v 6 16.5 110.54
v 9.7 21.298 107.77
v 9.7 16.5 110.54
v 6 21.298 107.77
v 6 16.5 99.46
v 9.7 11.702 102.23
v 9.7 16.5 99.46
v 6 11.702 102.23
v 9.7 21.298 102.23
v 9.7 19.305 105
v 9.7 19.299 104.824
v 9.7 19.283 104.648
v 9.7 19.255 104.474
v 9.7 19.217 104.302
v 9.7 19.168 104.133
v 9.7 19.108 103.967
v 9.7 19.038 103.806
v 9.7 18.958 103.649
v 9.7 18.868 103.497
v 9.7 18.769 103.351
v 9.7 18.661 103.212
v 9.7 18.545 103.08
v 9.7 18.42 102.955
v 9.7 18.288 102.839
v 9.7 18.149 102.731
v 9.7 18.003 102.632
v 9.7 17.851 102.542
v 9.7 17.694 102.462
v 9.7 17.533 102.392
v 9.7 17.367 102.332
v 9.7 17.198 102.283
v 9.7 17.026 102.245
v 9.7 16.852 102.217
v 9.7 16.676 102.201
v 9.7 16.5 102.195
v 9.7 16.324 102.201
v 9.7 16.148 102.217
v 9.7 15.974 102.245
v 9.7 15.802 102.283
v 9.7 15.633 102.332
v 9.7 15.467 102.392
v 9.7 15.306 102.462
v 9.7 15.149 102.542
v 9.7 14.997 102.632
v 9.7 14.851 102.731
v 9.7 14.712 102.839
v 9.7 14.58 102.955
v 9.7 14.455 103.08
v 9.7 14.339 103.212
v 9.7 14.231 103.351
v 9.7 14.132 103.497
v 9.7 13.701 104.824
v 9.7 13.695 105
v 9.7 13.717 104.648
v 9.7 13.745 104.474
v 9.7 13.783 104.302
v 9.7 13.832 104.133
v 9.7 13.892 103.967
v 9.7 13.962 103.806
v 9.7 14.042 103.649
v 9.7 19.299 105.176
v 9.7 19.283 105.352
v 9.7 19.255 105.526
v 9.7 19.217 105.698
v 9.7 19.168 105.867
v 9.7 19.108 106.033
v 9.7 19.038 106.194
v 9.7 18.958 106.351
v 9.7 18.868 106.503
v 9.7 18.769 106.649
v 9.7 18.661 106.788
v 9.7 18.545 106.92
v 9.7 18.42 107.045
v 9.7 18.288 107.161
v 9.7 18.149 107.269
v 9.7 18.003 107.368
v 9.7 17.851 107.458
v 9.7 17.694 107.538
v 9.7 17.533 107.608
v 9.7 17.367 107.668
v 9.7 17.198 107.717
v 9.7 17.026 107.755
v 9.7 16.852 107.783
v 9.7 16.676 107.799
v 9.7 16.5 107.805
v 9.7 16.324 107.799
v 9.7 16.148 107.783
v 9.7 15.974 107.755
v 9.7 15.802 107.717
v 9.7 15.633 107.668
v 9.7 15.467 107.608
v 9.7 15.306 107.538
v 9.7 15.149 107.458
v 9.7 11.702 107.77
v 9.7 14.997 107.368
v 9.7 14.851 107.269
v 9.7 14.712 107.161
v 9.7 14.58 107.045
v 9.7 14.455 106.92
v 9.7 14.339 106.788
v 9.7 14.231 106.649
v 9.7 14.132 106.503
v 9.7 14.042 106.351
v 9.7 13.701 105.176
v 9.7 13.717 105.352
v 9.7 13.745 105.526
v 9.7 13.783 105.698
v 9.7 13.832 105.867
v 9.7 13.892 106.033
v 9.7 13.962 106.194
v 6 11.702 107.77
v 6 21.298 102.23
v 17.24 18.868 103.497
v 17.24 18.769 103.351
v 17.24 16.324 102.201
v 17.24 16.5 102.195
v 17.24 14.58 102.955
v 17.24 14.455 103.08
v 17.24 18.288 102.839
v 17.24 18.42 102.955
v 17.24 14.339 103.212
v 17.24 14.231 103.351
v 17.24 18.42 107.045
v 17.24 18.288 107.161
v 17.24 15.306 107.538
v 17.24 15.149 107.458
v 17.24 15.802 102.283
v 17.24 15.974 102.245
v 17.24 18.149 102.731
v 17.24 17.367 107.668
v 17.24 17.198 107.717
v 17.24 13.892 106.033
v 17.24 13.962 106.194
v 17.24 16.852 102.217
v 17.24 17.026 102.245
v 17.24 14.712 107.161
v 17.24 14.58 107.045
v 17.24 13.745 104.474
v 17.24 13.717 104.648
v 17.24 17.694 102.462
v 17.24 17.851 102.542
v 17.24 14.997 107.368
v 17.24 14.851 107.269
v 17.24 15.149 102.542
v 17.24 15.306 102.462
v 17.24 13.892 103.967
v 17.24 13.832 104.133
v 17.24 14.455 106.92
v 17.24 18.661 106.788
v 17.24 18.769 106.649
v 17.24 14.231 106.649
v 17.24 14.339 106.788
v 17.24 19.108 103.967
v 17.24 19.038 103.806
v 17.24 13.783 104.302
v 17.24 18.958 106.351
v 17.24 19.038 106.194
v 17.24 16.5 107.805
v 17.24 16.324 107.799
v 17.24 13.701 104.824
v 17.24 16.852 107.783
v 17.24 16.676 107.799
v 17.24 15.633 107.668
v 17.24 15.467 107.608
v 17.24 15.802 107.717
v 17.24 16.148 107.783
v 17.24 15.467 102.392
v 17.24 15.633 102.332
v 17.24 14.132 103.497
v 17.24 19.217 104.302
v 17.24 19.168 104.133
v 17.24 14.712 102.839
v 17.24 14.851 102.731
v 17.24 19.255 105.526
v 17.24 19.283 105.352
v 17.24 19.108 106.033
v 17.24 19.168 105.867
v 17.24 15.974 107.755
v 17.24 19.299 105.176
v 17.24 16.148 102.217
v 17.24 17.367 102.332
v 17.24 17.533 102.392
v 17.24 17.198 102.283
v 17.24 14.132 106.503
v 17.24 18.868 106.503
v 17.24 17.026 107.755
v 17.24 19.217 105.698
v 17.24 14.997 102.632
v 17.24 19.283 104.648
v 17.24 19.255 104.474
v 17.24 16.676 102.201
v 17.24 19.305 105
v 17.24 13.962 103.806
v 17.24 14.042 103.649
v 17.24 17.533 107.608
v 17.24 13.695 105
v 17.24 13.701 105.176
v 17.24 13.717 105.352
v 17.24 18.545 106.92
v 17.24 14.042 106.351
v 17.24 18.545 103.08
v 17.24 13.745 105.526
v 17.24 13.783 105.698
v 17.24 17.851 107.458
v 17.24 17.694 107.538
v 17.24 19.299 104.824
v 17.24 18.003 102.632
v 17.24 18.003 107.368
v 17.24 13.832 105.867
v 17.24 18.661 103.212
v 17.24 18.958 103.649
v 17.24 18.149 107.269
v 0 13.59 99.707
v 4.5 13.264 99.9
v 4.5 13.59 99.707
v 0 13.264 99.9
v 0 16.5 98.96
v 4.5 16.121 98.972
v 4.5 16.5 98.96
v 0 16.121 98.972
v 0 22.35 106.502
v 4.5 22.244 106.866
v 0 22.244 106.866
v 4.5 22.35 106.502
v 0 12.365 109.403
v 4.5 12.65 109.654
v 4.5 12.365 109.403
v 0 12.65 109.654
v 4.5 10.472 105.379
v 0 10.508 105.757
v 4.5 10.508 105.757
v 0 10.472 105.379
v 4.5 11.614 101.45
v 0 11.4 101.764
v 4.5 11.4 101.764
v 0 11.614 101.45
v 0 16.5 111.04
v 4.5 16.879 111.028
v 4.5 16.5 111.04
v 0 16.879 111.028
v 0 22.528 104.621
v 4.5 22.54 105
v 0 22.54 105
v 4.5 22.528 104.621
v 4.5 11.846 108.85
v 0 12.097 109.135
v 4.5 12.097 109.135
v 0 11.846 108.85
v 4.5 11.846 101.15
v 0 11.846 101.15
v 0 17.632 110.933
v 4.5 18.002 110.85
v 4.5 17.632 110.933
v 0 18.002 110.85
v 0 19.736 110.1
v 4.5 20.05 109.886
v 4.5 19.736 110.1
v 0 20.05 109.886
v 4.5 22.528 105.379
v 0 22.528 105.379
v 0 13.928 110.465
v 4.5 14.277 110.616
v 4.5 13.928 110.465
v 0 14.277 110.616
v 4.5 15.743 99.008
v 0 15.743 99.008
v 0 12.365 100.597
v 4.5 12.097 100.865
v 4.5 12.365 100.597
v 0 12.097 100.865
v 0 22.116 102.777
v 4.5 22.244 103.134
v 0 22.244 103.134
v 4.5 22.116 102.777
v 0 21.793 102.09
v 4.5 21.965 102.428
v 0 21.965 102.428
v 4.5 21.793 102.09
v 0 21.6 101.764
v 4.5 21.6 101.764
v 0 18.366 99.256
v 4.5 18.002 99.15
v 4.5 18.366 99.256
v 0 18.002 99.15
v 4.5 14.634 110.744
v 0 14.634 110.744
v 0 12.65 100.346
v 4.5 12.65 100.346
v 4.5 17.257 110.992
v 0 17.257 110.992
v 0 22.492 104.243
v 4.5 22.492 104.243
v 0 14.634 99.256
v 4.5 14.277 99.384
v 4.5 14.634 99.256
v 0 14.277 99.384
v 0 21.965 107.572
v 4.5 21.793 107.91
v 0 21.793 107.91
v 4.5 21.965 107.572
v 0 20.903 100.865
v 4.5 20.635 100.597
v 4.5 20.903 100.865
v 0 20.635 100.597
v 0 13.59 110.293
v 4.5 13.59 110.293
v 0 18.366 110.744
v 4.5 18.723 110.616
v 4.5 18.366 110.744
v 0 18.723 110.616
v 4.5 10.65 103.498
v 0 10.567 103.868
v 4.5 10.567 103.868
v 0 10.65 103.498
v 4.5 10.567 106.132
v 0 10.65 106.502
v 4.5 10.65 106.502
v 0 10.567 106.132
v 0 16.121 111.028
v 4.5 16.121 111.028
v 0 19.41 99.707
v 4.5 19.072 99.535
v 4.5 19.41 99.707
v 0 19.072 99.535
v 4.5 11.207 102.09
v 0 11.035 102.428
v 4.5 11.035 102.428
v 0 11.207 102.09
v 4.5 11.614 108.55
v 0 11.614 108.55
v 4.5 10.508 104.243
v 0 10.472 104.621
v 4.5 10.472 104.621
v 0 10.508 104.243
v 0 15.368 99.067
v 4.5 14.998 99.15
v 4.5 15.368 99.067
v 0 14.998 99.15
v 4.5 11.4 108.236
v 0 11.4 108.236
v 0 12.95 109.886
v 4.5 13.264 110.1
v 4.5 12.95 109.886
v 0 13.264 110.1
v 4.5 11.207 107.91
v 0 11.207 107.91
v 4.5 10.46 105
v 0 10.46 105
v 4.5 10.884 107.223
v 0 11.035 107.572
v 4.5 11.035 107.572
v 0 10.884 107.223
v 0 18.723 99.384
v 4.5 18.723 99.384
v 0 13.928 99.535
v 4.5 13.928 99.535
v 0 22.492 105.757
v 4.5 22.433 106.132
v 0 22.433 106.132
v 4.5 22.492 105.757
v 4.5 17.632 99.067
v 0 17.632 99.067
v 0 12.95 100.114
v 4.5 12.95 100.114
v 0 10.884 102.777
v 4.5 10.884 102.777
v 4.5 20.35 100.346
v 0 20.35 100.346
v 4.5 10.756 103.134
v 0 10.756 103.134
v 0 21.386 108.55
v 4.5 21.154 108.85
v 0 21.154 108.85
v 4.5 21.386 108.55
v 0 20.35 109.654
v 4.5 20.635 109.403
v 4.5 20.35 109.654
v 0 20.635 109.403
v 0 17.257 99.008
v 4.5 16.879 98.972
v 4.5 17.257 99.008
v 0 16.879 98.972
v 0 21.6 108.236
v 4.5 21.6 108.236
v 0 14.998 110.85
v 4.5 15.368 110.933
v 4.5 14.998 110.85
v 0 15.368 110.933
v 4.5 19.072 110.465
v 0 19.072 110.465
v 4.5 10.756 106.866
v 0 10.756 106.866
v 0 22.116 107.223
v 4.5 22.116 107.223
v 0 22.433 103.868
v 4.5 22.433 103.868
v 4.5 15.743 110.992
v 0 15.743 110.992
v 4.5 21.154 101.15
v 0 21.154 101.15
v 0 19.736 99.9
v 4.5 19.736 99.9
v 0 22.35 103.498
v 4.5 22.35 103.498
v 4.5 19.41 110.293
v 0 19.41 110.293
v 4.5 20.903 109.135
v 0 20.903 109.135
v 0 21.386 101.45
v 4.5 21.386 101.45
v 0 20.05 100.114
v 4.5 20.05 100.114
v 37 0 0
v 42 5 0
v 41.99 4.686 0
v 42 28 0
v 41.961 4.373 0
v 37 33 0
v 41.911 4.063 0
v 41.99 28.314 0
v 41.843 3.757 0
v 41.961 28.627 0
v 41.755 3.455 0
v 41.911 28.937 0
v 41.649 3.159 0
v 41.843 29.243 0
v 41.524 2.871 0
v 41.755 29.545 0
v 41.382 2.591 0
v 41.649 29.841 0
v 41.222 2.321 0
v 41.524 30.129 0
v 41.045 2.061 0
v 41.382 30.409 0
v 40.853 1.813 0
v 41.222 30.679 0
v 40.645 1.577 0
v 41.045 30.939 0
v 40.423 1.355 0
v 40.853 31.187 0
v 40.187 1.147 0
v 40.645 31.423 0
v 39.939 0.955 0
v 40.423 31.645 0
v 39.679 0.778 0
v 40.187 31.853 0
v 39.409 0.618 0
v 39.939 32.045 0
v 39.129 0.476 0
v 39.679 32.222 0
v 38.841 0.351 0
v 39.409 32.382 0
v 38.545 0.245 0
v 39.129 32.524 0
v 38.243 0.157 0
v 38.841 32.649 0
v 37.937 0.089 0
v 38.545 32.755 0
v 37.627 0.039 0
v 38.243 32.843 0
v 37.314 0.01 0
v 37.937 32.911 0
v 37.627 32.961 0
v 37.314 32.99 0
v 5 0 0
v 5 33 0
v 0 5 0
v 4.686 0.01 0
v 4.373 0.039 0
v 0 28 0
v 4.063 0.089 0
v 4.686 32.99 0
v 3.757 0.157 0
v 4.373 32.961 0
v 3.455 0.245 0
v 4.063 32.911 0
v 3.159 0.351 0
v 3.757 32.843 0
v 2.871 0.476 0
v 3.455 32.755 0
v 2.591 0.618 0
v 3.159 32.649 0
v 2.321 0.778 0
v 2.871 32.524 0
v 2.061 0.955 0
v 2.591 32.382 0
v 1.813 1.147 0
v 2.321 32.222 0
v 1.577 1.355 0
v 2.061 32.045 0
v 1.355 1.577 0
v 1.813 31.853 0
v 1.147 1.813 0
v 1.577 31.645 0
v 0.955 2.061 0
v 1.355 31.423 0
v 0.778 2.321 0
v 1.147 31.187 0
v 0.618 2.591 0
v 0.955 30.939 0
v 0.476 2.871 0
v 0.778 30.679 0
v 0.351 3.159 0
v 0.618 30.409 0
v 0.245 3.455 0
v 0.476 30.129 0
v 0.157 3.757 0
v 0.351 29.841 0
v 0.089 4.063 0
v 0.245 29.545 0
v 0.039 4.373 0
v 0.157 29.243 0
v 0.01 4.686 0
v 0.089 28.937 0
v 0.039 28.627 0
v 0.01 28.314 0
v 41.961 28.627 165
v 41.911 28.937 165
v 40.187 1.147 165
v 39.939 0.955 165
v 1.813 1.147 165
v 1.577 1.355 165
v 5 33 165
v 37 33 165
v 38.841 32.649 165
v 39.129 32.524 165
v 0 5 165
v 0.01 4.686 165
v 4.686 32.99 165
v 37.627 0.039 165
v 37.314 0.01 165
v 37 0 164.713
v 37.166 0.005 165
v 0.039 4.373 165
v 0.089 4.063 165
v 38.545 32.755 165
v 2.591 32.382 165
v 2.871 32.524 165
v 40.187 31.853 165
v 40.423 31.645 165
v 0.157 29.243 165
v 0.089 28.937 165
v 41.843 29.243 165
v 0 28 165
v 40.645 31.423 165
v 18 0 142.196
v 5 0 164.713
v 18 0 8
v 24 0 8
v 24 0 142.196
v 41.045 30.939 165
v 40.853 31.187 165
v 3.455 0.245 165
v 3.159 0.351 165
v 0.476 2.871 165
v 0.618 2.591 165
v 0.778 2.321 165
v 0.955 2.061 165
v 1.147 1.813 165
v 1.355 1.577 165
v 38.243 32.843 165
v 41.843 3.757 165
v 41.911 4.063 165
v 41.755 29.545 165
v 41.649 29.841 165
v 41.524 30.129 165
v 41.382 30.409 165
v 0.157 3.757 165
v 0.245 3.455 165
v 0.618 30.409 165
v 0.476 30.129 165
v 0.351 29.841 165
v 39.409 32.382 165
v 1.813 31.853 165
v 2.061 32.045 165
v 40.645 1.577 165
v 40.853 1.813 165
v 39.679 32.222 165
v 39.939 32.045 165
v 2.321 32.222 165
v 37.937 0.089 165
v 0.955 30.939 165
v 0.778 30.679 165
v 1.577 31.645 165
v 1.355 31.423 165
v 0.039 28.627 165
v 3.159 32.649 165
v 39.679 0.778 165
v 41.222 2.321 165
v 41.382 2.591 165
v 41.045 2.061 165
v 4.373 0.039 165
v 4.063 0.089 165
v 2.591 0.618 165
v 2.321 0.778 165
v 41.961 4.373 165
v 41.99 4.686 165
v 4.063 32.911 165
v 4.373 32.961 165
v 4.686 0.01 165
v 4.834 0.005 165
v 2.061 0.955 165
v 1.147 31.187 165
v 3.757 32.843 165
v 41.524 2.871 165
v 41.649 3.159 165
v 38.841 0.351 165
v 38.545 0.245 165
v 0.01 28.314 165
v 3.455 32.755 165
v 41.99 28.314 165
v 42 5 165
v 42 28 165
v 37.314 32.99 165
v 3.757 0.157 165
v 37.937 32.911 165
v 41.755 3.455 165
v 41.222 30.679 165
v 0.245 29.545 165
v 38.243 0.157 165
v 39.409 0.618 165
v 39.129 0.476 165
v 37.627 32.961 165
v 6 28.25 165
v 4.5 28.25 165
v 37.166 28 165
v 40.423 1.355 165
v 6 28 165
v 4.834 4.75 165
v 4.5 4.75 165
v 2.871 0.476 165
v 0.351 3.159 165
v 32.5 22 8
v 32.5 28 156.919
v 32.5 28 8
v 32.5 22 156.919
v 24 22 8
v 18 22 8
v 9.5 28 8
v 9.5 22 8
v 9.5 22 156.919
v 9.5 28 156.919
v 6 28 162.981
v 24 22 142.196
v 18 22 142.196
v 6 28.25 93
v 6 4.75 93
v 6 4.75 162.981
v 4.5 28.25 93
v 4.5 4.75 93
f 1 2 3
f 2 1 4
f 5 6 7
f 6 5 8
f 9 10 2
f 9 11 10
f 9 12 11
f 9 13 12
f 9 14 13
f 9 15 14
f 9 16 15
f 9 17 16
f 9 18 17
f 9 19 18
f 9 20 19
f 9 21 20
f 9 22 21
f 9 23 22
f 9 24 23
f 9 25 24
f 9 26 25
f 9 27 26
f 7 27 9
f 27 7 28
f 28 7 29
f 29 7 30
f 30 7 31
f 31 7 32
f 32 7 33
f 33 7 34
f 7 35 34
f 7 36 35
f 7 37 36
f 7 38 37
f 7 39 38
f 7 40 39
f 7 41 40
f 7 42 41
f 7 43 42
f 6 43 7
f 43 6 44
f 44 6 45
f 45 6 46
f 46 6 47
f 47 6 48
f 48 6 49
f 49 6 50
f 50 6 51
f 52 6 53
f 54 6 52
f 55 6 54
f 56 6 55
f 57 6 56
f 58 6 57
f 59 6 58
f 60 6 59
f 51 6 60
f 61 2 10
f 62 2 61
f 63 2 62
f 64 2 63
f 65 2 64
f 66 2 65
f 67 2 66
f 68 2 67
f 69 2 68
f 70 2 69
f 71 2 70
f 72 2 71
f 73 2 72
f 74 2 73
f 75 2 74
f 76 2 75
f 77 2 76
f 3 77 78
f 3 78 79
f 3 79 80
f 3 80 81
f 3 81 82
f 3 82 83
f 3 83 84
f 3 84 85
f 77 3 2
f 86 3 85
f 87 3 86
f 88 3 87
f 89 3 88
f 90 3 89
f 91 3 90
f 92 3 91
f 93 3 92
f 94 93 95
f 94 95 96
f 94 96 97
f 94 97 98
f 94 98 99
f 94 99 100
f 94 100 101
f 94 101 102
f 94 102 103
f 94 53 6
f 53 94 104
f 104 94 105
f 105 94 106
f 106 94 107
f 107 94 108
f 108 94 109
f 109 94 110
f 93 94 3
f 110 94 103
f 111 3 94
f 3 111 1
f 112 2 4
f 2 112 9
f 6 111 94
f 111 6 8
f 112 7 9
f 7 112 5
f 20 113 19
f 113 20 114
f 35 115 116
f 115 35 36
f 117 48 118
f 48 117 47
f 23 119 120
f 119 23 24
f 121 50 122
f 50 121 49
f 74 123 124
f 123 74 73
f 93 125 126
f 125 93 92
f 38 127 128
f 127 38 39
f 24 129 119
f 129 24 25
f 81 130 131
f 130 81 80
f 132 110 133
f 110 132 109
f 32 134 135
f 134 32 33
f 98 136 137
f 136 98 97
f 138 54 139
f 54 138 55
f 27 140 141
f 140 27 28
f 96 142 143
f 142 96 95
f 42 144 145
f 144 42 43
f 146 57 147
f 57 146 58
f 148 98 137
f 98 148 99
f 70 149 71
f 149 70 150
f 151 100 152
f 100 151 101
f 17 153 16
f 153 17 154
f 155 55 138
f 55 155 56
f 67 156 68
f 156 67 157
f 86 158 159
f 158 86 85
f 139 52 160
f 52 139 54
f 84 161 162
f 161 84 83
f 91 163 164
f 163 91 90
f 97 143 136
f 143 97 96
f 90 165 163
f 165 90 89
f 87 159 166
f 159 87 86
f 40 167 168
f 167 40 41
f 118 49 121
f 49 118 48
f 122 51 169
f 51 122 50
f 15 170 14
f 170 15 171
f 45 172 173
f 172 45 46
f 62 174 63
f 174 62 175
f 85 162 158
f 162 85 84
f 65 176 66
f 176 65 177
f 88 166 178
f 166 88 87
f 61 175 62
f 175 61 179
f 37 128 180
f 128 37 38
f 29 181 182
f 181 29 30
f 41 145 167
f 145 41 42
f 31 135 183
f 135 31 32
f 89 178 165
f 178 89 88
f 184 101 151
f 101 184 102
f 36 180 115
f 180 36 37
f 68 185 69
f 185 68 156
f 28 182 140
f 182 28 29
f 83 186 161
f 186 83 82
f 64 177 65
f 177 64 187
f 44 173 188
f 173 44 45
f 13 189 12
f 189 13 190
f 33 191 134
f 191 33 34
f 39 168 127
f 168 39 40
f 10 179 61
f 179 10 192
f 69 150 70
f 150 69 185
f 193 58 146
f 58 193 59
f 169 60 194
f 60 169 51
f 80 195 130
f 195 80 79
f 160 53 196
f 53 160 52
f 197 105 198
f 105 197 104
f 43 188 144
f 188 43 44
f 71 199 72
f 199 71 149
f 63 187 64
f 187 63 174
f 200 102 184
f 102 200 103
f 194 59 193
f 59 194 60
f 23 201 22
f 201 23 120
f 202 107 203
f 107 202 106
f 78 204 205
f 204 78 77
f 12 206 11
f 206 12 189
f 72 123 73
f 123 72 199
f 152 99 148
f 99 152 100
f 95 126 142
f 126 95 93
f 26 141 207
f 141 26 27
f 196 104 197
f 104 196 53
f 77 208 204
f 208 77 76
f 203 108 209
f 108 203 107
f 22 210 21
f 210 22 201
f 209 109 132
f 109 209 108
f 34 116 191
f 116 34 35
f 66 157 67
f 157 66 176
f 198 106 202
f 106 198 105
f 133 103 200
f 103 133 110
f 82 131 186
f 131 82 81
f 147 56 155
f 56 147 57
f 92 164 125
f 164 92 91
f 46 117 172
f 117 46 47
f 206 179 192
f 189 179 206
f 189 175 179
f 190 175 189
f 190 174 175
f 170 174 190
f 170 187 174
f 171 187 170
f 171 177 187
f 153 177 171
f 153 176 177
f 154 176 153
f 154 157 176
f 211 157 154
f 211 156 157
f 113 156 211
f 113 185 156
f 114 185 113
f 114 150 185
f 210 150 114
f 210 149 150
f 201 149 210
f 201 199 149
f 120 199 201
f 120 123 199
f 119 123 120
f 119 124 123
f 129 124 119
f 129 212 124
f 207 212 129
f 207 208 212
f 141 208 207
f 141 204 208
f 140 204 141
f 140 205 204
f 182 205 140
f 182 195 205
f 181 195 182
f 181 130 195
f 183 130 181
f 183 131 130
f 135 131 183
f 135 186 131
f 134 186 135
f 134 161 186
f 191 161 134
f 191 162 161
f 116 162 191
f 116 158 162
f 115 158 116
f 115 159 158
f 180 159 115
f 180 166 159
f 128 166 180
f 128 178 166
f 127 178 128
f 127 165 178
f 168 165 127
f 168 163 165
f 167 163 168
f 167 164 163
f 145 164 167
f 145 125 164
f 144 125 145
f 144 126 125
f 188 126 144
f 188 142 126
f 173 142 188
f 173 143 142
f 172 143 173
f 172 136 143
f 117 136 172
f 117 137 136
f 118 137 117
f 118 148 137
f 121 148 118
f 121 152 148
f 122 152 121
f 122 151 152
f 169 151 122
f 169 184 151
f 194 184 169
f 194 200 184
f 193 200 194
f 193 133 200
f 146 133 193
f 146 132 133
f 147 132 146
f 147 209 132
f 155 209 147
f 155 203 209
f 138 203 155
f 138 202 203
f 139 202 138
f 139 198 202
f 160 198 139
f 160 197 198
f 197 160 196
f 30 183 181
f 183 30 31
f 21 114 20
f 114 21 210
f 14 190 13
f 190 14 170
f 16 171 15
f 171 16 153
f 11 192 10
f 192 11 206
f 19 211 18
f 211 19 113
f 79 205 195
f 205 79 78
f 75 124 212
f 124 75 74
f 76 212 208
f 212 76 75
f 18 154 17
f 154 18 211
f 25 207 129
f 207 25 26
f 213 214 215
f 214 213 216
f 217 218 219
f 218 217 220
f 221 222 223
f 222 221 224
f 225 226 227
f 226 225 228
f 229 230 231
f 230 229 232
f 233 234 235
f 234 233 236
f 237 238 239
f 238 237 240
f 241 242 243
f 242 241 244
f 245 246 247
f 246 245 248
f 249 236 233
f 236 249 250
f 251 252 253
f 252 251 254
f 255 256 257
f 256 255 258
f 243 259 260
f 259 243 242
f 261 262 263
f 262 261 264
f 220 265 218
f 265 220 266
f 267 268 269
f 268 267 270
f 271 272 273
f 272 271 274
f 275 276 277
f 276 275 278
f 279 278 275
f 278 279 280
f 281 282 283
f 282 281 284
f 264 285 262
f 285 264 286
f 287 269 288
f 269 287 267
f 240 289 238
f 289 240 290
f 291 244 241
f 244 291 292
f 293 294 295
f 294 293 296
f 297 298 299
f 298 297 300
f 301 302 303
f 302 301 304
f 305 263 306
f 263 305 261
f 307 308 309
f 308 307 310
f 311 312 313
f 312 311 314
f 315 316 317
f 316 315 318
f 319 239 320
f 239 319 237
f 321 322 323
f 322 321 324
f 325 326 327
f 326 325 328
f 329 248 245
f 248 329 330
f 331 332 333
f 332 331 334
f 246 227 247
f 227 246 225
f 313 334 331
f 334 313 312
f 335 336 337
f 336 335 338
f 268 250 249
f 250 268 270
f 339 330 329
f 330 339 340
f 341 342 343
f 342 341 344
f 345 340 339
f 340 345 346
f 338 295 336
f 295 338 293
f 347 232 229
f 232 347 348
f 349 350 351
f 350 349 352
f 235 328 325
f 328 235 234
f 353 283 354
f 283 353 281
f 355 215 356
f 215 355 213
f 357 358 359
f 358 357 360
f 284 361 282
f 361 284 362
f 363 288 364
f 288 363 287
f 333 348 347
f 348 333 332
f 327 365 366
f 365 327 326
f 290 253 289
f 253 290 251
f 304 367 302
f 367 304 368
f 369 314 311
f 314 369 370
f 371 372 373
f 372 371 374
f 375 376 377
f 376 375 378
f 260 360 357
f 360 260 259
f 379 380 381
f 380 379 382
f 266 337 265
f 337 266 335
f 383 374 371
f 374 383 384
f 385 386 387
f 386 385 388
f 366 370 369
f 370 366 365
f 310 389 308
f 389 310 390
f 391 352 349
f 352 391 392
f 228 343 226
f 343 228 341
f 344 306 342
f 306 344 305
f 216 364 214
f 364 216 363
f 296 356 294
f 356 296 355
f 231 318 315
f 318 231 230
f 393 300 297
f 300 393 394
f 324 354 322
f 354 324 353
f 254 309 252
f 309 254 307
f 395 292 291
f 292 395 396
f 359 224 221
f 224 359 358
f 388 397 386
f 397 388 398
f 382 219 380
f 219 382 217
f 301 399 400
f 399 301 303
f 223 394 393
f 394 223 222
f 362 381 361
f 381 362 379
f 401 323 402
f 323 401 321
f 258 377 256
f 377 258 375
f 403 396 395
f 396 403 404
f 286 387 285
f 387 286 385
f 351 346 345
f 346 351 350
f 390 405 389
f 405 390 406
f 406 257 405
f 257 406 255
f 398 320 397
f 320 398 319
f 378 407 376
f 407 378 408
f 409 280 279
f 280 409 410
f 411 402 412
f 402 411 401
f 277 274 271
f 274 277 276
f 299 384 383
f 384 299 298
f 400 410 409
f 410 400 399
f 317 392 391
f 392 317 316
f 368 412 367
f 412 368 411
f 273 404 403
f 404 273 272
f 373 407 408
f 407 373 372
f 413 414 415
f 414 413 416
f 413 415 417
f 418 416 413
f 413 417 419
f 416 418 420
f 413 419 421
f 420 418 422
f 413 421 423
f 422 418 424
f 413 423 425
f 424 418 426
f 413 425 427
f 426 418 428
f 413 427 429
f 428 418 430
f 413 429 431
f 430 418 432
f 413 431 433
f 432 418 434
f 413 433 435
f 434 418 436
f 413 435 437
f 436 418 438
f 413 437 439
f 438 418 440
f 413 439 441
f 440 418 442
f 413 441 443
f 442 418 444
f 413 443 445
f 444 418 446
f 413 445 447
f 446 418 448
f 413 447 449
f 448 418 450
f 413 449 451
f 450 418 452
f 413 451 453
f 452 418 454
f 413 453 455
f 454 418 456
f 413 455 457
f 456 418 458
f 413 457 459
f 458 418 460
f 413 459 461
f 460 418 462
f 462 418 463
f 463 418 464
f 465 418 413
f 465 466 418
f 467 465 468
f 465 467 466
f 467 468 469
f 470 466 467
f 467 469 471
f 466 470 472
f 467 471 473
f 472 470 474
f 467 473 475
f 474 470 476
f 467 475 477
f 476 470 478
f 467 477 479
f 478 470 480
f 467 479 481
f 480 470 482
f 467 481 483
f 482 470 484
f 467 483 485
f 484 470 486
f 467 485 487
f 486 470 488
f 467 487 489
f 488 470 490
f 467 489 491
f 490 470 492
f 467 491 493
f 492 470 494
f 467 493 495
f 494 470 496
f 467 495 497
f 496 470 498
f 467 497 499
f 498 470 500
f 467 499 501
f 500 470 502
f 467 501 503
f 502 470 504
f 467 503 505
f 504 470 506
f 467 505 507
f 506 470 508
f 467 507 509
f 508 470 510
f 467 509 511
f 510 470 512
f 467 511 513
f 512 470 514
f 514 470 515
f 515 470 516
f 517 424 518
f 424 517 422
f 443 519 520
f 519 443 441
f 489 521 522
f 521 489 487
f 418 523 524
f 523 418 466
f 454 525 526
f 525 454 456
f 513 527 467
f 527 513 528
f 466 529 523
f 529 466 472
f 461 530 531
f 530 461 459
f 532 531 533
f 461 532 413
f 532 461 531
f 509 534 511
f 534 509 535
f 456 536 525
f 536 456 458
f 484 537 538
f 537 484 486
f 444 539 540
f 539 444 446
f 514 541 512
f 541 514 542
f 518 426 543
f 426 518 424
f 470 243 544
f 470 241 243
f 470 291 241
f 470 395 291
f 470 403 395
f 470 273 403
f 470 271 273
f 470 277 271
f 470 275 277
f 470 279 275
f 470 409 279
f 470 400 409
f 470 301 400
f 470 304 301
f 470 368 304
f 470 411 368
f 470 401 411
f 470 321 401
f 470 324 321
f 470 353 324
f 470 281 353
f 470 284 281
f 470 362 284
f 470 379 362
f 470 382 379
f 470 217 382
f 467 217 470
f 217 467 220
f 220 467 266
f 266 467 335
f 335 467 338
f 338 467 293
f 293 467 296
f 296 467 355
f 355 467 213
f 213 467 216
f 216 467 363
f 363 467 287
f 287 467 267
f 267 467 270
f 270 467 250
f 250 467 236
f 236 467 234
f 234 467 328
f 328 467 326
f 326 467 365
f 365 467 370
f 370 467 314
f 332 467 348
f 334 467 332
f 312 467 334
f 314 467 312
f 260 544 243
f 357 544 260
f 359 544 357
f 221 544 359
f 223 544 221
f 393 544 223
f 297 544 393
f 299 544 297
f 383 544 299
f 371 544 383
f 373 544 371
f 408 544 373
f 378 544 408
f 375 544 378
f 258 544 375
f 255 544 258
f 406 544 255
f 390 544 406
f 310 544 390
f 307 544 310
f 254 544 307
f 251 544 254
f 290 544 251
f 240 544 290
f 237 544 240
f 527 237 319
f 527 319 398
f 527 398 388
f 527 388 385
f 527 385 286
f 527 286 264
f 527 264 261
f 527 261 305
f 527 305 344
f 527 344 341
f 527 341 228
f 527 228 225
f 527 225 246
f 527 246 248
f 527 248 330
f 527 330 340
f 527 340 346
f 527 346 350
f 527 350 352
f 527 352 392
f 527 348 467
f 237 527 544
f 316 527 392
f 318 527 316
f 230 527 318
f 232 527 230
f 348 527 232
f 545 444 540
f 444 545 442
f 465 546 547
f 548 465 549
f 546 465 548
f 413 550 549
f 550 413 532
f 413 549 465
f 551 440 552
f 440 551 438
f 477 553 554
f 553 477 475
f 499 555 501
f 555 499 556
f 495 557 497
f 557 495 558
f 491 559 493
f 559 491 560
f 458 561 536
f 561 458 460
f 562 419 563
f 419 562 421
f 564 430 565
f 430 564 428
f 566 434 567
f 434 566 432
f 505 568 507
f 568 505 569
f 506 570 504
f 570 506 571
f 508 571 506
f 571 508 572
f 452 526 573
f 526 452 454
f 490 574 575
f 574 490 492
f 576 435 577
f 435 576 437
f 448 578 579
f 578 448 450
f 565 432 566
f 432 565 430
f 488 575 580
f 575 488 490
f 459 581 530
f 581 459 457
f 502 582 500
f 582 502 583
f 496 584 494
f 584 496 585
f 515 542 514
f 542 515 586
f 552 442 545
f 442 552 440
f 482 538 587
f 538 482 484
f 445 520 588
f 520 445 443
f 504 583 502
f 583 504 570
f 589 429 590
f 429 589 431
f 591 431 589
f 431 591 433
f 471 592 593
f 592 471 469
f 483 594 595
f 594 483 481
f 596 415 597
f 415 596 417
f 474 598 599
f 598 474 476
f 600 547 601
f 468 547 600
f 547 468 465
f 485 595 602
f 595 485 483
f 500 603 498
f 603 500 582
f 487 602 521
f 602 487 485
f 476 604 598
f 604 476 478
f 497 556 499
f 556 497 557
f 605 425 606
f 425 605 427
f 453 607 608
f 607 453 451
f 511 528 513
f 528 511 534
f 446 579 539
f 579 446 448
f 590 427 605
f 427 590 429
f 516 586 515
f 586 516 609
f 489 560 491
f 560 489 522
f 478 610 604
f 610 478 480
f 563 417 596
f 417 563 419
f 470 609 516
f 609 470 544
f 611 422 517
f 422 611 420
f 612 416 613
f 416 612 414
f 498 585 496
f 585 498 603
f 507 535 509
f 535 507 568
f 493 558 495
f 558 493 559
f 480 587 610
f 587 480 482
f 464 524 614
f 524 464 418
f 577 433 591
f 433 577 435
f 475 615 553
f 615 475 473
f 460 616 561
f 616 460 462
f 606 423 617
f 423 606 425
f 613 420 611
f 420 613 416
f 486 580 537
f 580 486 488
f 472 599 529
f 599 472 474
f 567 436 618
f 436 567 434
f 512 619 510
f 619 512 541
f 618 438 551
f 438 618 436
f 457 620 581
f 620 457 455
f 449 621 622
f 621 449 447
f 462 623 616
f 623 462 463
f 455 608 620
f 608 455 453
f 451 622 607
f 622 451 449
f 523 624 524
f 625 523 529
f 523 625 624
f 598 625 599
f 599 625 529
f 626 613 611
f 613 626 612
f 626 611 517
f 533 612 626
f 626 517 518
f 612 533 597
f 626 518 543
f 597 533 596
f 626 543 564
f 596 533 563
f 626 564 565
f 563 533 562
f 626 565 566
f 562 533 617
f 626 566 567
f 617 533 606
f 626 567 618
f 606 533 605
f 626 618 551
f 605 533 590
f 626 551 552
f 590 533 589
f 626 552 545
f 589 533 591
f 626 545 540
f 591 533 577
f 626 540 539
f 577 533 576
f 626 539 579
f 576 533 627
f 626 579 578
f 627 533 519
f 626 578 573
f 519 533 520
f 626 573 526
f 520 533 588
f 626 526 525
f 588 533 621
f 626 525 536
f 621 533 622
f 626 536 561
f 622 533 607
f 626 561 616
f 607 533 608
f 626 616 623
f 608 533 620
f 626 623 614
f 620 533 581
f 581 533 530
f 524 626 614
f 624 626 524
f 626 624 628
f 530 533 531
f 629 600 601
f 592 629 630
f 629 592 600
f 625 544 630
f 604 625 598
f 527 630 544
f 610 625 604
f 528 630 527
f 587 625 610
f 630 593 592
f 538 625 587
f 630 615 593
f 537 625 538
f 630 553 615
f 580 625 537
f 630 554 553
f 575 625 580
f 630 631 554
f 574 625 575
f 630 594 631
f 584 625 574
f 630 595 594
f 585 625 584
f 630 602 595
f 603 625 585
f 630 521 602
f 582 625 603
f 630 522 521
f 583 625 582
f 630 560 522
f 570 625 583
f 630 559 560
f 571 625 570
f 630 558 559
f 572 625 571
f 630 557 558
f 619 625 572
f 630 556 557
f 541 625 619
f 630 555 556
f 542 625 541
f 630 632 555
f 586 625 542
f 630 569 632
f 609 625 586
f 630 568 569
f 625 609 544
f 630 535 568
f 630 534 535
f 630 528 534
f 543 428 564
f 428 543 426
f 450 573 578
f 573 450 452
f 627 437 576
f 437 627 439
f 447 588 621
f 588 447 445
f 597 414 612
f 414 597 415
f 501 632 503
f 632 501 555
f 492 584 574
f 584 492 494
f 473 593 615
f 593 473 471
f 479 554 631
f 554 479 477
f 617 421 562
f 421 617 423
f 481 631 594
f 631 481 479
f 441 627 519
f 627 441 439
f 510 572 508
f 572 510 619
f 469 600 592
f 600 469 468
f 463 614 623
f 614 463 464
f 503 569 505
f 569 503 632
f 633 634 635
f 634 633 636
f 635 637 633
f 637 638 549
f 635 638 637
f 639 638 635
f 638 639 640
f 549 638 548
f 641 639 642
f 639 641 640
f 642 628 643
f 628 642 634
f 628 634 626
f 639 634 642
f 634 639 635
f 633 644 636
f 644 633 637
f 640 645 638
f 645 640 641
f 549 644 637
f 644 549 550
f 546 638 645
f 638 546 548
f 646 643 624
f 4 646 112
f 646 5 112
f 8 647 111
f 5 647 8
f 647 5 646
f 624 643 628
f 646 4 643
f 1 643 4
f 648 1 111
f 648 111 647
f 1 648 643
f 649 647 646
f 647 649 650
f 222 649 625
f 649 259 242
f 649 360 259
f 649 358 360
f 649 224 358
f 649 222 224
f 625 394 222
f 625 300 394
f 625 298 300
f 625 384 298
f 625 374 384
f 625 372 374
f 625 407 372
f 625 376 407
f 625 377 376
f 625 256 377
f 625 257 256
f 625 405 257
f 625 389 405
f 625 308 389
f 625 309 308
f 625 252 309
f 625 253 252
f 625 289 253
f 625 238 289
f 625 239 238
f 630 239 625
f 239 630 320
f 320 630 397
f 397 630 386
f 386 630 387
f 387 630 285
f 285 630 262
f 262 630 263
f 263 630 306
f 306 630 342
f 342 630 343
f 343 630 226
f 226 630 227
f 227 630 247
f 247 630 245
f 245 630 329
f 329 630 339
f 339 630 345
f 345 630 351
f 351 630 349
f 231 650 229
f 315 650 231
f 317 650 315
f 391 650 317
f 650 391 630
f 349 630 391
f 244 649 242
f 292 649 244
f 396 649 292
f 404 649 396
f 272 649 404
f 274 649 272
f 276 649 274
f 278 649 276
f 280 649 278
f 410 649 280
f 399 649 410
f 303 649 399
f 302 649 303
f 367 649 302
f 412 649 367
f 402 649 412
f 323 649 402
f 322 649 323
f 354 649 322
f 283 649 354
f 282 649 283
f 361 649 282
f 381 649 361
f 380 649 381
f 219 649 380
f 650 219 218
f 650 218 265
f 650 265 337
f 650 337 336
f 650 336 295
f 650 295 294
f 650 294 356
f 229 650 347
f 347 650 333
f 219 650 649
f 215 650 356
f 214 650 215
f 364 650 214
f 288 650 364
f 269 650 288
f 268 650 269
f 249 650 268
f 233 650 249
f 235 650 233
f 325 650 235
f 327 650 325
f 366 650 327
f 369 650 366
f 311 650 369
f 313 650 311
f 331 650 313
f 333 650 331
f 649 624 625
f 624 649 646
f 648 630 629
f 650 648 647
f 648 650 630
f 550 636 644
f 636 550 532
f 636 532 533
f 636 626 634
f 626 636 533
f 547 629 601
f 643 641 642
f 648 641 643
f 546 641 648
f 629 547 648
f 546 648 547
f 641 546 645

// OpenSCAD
// Speed Square Holster
// By Jay Littlefield
// August 27, 2016

// Base Parameters
width = 42;
//length=26;
height=165;
basethickness=8;
cornerradius=5;
// Length, Width computed below

// Square Dimensions
// 0.886 inches
square_width=23;

//0.193 inches
square_thick=5;

//1 mm total clearance around
square_clear=1;

//Belt Clip
clip_height=70;
clip_width=23;
clip_thickness=1;
clip_clearance=0.5;
bolt_hole_dist_from_top = 60;
//bolt_hole_dist_from_top = 7.5;


// Nut Dimensions
nut_s = 10.58;
nut_d = 5.05;
nut_m = 3.20;

nut_width_clearance = 0.5;
nut_depth_clearance = 1;

// Bolt dimensions
bolt_clearance_diam = 5.61;
bolt_depth = 15.74;
bolt_depth_clearance = 1;

// Computed width / length of base
length = clip_width + 2*cornerradius;

length_square_ratio = 2/3;
width_ratio = 4/8;


CHX = 4*clip_thickness + clip_clearance;
CHY = (length - clip_width - clip_clearance)/2;


$fn=100;



module roundedcube(xdim ,ydim ,zdim,rdim){
hull(){
translate([rdim,rdim,0])cylinder(h=zdim,r=rdim);
translate([xdim-rdim,rdim,0])cylinder(h=zdim,r=rdim);

translate([rdim,ydim-rdim,0])cylinder(h=zdim,r=rdim);
translate([xdim-rdim,ydim-rdim,0])cylinder(h=zdim,r=rdim);
}
}



module nutandbolt(nut_width,nut_depth,bolt_dia,bolt_depth, nut_spacer_depth) {
    
    // Nut
    linear_extrude(height=nut_depth) {
        circle(nut_width,$fn=6);
    }

    // Bolt
    linear_extrude(height=bolt_depth) {
        circle(bolt_dia,$fn=100);
    }

    // Front clearance hole
    linear_extrude(height=nut_spacer_depth) {
        circle(nut_width+0.5,$fn=100);
    }  
    
    // Taper for 3D printing
    //translate([-nut_width/2,0,0])
    //linear_extrude(height=nut_spacer_depth) {
    //    circle(nut_width+1,$fn=4);
    //}   
}



difference() {
    
    // Base 
    roundedcube(width,length,height,cornerradius);
    //cube([width,length,height]);
  
    // Square Base
    translate([width*width_ratio - square_width/2,length*length_square_ratio,basethickness]) cube([square_width,     square_thick+square_clear,height]);
       
    
    // Square Arm
    translate([width*width_ratio -(square_thick + square_clear)/2,0,basethickness]) {
       
        cube([square_thick+square_clear,length*length_square_ratio,height]);
    }


      // Clip Holder
    translate([CHX,CHY,height-clip_height - 2]) {
            cube([clip_thickness+clip_clearance,clip_width+clip_clearance,clip_height+3]);
    }

           
    // Nut and bolt hole
    translate([-0.5,length/2,height-    bolt_hole_dist_from_top]) {
        rotate([90,90,90]) {
            nutandbolt((nut_s+nut_width_clearance)/2,nut_m+nut_depth_clearance+CHX+clip_thickness+clip_clearance,bolt_clearance_diam/2, bolt_depth + bolt_depth_clearance +   nut_depth_clearance,CHX+1.5);
        }
    }
  
    // Cutaway
   translate([width*width_ratio,0,height-5]) {
        rotate([270,90,0]) {
            linear_extrude(height=length*           length_square_ratio+square_thick            +square_clear) {
                circle(square_width,$fn=3);
            }   
        }
    }
     
    
}
